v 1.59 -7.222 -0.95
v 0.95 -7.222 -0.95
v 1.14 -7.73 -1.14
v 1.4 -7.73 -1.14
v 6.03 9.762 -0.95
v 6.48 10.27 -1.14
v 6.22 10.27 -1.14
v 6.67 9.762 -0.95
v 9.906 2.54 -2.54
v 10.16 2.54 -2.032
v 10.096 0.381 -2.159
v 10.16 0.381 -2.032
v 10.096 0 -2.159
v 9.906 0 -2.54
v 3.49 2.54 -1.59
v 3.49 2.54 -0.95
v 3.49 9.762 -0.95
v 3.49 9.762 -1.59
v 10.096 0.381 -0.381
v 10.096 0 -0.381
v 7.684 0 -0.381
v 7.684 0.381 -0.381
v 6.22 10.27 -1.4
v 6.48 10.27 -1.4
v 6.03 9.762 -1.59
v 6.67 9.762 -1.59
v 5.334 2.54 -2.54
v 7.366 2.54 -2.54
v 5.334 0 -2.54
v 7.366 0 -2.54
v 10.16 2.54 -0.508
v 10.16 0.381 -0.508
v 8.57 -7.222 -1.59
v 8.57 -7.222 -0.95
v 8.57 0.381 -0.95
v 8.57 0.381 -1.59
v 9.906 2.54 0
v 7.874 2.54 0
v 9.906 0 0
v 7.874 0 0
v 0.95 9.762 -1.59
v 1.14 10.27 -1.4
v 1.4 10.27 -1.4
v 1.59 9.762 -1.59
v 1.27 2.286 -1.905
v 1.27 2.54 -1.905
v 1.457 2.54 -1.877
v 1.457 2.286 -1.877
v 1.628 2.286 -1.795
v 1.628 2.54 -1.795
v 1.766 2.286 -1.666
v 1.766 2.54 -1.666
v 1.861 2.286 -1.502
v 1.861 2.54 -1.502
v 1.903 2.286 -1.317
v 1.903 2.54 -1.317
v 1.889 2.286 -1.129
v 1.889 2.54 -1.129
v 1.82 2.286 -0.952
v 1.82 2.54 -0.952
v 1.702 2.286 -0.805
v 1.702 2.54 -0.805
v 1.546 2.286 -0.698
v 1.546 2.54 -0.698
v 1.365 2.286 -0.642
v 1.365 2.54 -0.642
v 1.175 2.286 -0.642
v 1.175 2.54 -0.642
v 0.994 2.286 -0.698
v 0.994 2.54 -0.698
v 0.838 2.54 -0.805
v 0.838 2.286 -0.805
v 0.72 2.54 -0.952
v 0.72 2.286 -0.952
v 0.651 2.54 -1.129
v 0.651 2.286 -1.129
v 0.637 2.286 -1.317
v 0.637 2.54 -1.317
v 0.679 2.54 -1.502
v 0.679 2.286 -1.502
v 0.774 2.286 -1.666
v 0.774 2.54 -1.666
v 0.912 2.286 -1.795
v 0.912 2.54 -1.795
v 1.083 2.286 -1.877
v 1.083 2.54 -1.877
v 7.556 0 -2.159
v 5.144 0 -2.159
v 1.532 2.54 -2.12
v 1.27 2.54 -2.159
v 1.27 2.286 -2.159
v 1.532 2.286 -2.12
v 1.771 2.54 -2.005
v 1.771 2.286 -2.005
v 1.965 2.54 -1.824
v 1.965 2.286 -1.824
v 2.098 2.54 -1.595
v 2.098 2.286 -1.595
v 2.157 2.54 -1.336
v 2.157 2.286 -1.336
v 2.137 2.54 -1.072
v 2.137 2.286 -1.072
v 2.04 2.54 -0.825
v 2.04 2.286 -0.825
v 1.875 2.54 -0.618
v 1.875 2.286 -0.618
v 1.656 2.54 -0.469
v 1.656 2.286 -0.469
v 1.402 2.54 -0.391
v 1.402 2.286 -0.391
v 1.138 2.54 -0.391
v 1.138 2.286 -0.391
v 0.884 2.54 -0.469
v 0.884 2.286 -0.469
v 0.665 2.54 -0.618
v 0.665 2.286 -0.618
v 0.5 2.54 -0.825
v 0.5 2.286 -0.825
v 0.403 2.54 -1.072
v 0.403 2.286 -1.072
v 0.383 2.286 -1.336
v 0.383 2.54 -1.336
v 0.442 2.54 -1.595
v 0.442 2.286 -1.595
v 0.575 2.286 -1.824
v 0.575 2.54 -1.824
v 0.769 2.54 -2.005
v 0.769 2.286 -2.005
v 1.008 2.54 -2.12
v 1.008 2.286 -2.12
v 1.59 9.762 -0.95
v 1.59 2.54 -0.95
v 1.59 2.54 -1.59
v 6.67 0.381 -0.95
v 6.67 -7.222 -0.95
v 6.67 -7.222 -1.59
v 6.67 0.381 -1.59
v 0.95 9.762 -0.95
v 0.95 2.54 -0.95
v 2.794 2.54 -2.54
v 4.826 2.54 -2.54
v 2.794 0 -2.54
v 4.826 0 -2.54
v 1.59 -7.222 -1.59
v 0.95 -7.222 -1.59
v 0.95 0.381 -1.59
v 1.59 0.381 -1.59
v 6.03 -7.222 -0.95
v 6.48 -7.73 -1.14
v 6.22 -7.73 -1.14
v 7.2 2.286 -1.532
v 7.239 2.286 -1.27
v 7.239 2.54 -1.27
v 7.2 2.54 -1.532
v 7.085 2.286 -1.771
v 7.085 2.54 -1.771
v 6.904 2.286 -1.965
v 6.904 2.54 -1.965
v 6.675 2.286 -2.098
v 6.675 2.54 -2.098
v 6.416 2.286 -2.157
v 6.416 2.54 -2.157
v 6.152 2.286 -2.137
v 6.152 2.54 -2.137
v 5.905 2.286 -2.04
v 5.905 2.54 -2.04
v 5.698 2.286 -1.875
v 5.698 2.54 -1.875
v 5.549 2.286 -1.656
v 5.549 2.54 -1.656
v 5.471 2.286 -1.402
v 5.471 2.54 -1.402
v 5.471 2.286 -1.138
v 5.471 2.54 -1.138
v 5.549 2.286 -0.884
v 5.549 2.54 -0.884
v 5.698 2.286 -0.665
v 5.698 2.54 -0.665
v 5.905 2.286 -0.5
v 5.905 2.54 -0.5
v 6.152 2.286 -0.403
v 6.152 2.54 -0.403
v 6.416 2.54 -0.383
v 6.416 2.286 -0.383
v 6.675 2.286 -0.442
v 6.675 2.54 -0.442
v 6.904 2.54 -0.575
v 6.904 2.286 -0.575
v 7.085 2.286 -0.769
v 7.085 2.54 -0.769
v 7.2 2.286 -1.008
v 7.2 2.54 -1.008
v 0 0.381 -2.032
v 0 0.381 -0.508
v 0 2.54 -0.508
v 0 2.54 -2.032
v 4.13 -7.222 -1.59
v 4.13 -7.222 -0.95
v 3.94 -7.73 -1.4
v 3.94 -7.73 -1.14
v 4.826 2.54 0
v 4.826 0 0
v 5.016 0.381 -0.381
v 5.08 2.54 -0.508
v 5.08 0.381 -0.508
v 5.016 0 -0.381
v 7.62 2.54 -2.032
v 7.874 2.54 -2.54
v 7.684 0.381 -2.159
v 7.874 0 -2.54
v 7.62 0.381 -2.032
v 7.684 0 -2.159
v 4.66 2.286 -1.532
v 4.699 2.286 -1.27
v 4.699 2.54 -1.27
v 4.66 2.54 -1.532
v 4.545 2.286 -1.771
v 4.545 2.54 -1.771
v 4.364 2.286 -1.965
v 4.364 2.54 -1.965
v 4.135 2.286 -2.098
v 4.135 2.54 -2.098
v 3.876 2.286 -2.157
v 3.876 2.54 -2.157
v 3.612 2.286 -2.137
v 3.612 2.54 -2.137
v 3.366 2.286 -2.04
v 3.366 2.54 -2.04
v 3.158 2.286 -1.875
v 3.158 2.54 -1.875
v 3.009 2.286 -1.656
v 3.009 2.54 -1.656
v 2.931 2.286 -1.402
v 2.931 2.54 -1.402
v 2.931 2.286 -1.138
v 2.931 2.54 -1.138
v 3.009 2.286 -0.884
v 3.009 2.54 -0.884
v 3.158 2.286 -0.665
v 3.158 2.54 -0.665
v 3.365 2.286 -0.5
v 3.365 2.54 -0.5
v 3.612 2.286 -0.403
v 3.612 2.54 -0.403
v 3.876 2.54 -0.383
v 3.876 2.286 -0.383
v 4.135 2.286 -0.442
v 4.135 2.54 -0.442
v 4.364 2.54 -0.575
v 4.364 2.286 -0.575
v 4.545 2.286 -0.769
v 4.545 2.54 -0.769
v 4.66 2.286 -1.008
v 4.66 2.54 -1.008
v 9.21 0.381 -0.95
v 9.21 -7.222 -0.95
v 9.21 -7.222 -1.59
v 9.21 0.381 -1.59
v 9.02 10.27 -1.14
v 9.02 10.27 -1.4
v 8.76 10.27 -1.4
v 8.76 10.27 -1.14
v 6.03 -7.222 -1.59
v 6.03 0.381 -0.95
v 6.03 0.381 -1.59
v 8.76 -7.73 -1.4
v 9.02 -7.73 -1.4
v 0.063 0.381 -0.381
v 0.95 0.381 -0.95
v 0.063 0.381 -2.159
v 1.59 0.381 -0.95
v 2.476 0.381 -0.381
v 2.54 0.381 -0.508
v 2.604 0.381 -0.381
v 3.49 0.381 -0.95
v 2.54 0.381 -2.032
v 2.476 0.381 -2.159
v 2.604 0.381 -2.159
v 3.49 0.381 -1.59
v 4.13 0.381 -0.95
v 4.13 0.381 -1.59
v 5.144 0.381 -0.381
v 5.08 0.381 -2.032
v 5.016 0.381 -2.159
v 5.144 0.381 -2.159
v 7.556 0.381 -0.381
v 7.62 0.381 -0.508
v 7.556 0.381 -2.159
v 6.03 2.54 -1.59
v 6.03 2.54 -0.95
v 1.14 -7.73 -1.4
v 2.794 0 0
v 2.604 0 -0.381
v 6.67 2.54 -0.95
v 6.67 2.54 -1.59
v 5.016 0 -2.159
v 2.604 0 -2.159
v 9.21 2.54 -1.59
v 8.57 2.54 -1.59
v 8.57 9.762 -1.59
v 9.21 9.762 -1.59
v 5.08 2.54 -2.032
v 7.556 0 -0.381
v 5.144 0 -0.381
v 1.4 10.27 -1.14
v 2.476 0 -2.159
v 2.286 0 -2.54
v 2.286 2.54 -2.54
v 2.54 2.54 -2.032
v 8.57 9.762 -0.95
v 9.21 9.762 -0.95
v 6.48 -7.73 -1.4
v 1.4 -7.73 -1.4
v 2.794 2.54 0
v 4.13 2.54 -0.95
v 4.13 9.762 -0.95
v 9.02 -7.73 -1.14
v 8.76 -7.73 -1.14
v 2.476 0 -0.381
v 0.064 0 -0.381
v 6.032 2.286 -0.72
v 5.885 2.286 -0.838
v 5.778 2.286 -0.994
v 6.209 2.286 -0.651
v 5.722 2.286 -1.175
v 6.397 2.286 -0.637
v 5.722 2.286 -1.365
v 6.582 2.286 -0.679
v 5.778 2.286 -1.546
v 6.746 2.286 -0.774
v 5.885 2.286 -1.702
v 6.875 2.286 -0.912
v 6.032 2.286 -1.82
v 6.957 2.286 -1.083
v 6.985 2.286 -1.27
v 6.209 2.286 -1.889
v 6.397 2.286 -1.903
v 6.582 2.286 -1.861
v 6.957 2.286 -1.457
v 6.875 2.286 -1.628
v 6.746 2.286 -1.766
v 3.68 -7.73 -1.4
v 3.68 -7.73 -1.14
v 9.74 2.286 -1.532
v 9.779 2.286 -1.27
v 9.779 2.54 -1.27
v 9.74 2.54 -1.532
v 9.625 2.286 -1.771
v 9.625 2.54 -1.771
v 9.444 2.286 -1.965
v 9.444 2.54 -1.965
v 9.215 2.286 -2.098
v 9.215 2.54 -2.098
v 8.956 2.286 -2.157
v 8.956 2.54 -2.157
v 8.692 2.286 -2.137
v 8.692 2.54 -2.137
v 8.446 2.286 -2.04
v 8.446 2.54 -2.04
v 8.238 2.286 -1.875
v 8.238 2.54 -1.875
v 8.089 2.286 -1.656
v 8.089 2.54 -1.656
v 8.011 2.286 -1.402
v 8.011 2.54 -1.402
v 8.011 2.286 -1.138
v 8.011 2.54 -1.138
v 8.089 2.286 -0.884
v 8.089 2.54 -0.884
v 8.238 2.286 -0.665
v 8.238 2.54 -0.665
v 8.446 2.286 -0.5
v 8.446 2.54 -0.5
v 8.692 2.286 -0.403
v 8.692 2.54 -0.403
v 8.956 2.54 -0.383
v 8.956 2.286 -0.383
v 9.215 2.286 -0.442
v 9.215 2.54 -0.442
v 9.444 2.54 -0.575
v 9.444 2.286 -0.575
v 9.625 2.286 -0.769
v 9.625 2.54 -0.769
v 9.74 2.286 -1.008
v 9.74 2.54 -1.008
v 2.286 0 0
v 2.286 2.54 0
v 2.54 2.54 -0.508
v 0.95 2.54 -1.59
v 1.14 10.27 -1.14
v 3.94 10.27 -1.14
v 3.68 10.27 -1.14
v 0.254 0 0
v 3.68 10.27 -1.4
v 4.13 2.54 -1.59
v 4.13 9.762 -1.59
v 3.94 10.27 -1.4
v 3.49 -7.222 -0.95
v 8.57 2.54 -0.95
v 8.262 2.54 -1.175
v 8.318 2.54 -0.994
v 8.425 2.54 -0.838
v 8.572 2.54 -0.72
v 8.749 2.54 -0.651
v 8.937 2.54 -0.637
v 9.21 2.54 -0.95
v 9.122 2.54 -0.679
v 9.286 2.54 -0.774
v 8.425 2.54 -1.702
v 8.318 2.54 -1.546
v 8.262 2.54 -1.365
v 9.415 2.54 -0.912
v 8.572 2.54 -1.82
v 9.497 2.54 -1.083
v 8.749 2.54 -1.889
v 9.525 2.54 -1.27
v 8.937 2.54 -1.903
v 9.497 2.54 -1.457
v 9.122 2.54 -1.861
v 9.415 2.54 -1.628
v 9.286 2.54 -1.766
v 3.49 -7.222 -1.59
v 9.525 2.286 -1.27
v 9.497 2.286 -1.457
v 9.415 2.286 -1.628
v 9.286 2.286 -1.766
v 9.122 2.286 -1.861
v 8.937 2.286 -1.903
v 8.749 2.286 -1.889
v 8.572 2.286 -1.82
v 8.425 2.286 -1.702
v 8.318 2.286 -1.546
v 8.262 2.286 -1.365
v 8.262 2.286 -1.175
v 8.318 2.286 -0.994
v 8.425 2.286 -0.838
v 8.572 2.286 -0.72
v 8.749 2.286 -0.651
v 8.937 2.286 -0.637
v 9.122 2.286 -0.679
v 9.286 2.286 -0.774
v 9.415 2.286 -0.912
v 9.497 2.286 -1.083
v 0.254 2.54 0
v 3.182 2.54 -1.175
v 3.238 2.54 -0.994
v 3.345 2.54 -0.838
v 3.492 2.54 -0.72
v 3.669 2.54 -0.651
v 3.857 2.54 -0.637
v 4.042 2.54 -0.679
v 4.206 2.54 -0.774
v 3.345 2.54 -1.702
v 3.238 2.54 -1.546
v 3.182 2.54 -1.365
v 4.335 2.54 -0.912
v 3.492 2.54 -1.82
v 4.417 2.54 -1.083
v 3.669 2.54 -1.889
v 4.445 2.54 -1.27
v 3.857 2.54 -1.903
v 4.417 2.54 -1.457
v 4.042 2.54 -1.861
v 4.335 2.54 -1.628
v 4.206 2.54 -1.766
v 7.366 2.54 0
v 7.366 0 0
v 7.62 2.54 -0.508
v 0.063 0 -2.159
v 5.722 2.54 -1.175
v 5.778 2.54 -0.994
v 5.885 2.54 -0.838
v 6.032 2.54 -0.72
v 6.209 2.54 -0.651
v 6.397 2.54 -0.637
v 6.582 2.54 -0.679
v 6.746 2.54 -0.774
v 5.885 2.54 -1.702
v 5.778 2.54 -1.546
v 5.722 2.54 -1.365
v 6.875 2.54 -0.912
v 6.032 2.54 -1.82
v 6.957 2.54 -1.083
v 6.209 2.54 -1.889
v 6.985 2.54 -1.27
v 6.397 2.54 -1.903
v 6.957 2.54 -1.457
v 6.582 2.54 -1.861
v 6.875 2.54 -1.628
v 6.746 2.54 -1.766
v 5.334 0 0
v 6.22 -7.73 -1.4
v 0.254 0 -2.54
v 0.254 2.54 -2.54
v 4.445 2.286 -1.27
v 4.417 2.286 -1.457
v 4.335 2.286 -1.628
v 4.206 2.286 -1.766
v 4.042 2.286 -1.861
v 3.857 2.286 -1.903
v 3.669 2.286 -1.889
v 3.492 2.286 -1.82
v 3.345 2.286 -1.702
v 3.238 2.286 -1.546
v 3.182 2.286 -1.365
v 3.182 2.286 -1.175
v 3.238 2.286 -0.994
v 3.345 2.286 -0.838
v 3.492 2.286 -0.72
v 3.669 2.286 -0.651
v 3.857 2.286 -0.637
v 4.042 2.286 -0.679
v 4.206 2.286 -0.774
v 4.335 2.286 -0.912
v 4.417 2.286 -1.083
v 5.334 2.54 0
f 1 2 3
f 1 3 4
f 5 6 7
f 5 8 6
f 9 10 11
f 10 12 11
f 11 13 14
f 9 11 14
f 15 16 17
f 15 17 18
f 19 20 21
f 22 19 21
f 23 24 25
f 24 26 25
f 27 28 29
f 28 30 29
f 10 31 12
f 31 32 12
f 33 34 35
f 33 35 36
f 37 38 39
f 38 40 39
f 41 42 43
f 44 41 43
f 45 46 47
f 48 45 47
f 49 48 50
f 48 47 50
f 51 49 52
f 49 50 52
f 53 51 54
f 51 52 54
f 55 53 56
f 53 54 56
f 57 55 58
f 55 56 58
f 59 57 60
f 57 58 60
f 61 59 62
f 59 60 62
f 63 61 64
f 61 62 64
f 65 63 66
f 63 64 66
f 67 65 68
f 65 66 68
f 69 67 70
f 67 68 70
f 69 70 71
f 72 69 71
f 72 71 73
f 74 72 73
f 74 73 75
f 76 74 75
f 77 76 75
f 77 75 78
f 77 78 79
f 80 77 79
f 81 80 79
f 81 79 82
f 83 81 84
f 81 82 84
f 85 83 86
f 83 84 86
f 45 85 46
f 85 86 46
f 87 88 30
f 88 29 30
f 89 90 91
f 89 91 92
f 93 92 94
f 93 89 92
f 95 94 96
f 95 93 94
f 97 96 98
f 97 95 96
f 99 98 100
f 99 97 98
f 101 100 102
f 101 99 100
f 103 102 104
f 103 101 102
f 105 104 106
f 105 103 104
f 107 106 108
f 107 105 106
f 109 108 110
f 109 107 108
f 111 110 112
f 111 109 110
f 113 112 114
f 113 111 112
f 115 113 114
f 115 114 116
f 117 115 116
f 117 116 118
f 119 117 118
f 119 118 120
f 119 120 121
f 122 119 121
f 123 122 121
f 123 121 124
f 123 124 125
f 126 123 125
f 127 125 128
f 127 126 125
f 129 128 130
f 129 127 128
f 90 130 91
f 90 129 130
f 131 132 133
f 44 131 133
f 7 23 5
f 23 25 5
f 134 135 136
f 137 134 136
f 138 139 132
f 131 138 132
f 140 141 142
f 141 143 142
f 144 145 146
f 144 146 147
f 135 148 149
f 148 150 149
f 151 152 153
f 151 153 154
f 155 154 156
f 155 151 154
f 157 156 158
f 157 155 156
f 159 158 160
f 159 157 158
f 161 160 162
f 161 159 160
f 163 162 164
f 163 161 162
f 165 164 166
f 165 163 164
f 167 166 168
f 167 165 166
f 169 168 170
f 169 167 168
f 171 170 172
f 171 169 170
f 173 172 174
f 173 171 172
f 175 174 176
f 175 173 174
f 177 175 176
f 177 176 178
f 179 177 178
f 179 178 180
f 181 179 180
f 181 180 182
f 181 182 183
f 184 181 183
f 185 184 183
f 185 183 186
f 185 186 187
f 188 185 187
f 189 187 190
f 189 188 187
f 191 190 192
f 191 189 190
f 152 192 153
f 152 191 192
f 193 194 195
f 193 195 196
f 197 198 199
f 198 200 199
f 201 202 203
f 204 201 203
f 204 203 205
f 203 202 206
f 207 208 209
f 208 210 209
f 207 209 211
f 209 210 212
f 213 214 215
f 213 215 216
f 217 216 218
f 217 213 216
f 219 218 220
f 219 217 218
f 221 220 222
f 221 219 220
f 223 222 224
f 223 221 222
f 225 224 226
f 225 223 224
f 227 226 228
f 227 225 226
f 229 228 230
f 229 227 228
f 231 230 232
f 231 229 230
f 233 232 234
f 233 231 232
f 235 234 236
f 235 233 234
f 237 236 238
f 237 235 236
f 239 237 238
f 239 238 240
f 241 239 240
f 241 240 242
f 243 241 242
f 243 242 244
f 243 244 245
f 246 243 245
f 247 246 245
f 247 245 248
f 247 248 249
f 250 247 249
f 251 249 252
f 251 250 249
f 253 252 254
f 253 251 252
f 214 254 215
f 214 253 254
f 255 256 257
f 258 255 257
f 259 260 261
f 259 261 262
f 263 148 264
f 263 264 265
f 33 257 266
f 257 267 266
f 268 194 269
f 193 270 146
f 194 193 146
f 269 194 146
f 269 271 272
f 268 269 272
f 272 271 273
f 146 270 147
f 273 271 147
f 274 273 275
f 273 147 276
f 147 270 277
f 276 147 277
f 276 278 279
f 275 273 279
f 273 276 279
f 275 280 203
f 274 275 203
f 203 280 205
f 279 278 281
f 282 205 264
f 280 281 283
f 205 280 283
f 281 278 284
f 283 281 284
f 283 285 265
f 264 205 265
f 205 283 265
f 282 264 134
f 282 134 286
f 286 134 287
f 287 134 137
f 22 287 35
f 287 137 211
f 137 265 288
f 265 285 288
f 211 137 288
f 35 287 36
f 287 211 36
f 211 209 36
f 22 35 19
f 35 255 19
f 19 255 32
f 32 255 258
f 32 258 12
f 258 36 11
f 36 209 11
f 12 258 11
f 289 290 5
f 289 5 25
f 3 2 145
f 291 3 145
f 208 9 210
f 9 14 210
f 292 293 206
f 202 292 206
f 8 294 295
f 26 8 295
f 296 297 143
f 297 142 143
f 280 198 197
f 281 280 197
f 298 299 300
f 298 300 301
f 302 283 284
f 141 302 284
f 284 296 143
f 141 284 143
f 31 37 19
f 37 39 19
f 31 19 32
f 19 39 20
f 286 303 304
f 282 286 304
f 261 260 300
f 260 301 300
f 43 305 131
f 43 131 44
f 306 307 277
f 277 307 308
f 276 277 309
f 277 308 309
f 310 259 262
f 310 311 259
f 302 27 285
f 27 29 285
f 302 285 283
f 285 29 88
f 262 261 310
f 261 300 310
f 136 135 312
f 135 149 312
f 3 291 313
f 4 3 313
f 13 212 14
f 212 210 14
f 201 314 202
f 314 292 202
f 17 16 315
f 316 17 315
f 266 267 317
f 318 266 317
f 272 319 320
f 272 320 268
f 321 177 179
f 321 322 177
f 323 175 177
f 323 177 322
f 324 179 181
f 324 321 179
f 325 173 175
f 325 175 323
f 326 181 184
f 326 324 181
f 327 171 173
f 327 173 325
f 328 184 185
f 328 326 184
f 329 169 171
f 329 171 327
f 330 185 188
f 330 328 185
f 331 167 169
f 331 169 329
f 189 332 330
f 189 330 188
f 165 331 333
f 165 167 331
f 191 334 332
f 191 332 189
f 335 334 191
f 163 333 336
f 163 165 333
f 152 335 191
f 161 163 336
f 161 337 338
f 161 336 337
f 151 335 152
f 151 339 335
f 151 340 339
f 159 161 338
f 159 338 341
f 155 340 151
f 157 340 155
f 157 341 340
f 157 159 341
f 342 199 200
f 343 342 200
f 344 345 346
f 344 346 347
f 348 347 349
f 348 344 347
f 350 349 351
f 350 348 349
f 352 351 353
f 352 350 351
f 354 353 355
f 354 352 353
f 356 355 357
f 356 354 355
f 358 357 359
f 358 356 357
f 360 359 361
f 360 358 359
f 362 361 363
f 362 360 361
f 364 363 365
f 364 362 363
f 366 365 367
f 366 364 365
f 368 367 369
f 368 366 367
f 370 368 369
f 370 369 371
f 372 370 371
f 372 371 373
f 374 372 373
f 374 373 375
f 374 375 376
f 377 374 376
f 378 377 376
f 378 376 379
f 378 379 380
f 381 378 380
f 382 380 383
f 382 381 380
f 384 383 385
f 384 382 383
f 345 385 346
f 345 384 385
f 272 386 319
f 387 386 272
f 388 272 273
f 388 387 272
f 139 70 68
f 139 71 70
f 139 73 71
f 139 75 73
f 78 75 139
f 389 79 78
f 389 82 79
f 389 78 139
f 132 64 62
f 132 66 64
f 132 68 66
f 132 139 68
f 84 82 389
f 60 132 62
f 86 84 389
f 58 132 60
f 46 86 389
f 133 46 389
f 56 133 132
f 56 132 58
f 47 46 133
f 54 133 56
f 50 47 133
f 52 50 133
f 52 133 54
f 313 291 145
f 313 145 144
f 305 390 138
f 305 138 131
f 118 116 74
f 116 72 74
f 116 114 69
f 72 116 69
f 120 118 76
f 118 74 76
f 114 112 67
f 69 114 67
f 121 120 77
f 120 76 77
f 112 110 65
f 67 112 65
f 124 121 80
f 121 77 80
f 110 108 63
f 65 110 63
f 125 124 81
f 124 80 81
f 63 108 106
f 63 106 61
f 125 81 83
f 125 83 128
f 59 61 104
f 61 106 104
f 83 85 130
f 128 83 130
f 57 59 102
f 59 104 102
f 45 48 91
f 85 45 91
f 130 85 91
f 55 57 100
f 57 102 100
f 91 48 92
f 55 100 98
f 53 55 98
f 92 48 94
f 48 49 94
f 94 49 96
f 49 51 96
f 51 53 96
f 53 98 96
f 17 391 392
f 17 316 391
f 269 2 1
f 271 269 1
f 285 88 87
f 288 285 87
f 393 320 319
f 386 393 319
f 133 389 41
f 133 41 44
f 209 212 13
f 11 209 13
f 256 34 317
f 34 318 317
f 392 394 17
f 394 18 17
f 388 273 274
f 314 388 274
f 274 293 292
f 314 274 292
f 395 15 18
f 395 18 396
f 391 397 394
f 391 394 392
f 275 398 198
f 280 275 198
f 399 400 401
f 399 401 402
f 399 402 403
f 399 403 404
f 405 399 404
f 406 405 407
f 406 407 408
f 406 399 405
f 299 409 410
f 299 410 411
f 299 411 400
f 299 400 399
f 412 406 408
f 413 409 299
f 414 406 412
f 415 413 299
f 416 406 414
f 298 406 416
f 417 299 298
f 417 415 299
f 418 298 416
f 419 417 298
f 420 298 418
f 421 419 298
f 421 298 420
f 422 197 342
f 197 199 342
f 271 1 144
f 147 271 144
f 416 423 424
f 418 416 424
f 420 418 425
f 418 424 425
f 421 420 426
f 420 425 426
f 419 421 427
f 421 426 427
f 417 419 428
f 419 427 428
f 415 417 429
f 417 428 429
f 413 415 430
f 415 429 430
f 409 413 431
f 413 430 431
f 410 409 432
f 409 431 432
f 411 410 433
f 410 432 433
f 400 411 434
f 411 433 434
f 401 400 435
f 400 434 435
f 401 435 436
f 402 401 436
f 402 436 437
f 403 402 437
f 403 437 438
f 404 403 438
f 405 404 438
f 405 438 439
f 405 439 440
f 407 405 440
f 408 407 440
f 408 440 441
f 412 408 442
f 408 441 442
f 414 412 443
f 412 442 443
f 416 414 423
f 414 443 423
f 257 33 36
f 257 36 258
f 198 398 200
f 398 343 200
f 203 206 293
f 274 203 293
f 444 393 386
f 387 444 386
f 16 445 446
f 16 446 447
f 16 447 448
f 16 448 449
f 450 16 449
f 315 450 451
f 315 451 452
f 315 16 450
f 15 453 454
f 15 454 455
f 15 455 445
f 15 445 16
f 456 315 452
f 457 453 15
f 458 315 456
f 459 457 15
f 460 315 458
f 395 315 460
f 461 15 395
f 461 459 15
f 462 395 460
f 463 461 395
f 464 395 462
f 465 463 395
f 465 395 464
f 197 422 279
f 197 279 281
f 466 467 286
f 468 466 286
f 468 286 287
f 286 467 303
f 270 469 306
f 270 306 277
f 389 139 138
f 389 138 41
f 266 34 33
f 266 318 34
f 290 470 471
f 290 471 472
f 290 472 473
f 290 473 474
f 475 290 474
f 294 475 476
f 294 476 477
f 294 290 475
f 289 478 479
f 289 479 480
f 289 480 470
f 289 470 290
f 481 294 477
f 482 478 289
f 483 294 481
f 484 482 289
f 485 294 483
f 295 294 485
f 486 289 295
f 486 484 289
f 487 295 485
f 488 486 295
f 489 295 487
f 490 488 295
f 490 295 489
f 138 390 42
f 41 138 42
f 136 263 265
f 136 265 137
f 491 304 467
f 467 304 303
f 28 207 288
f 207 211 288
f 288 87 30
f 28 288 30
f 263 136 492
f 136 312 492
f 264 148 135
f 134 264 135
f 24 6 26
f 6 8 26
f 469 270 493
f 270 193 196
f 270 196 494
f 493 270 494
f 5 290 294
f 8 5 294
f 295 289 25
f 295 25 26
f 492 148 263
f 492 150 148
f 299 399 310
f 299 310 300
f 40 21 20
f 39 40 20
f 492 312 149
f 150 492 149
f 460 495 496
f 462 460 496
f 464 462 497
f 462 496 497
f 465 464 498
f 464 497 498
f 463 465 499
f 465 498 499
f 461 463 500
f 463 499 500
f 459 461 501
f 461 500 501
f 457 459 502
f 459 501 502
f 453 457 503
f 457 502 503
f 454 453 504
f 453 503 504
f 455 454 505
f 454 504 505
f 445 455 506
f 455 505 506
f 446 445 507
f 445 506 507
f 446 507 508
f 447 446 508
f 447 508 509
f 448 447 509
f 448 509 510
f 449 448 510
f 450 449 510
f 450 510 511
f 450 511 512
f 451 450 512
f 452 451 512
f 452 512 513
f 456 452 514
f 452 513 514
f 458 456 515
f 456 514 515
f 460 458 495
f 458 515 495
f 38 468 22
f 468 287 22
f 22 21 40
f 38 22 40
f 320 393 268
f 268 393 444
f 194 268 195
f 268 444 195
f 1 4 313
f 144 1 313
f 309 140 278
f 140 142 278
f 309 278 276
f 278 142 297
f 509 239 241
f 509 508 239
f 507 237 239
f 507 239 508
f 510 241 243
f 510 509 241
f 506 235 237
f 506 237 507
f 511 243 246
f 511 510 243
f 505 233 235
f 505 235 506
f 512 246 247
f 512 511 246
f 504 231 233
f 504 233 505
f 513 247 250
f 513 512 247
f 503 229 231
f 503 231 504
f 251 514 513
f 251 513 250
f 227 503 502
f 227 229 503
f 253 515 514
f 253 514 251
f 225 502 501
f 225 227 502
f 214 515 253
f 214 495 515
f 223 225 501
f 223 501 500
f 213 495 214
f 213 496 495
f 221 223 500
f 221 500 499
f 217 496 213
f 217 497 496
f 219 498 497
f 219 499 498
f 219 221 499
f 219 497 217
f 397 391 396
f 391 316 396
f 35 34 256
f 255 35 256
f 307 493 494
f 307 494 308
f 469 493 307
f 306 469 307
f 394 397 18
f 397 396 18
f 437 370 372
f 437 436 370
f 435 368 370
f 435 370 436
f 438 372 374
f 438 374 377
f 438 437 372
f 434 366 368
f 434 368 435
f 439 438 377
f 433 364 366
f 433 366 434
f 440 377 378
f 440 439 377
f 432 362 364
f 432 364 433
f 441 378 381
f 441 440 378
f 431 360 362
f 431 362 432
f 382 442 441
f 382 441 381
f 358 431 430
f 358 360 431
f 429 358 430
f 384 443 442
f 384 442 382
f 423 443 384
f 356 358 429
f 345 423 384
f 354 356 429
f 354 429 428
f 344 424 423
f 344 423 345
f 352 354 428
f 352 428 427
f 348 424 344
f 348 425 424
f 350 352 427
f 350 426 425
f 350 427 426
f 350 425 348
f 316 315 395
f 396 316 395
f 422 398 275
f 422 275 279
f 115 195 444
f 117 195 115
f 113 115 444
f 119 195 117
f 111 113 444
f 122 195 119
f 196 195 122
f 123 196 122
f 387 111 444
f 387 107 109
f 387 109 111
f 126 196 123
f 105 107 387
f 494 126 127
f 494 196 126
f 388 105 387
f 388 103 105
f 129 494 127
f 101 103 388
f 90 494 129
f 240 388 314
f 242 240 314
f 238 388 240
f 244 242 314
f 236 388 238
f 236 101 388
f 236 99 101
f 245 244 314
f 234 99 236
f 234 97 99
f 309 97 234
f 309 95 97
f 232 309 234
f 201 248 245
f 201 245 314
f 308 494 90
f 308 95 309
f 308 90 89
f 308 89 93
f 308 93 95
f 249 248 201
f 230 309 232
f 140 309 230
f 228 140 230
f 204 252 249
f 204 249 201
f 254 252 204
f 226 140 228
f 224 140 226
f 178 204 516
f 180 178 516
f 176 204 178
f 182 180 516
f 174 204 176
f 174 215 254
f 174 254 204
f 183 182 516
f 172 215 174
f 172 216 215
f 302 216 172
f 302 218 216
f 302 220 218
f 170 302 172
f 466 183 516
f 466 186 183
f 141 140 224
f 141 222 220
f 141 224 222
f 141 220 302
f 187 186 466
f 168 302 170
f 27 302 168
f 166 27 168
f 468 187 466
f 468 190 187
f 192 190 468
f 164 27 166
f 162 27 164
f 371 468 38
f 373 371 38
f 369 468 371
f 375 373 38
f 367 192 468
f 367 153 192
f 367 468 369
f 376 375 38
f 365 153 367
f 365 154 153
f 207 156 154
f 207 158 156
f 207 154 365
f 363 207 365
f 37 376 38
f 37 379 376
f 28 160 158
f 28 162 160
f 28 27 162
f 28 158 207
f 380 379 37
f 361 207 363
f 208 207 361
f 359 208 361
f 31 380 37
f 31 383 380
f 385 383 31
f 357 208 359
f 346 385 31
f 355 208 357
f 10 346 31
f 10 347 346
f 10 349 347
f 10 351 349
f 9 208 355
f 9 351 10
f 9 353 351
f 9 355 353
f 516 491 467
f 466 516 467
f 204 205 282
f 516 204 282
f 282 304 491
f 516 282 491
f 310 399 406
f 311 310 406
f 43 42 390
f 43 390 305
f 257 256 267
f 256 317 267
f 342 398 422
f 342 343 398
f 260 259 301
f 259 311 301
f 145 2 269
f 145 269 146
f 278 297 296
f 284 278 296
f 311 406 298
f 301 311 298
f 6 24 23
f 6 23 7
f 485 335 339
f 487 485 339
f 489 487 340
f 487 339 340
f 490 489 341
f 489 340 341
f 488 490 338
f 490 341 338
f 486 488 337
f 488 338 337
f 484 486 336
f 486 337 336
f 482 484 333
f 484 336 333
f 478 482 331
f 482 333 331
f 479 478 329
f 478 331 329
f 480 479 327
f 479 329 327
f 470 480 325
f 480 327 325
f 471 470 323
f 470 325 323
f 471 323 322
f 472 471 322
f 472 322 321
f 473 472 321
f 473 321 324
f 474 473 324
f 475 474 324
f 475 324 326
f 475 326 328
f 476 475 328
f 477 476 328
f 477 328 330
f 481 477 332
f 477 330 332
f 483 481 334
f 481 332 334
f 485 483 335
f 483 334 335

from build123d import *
from OCP.BRepFilletAPI import BRepFilletAPI_MakeChamfer

# Parameters (mm, degrees)
SKETCH1_W                          = 2.54
SKETCH1_H                          = 2.54
MAIN_BODY_DEPTH                    = 2.54
SKETCH3_W                          = 1.778
SKETCH3_H                          = 0.381
CUT_EXTRUDE1_DEPTH                 = 5.399409051
CUT_EXTRUDE2_DEPTH                 = 5.399409051
PIN_START                          = -10.27
SKETCH2_W                          = 0.64
SKETCH2_H                          = 0.64
PIN_DEPTH                          = 18
CHAMFER1_SIZE                      = 0.508
CHAMFER1_SIZE2                     = 0.1905
CHAMFER2_SIZE                      = 0.1905
CHAMFER2_SIZE2                     = 0.508
ESQUISSE1_R                        = 0.889
ESQUISSE1_R_2                      = 0.635
ENL_V_MAT_EXTRU_1_DEPTH            = 0.254
R_P_TITION_START                   = 0.381
R_P_TITION_LIN_AIRE3_DEPTH         = 1.905
R_P_TITION_START_2                 = -7.222
R_P_TITION_LIN_AIRE3_2_OUTLINE_W   = 0.64
R_P_TITION_LIN_AIRE3_2_OUTLINE_H   = 0.64
R_P_TITION_LIN_AIRE3_2_DEPTH       = 16.984
R_P_TITION_START_3                 = 2.286
R_P_TITION_LIN_AIRE3_3_OUTLINE_R   = 0.889
R_P_TITION_LIN_AIRE3_3_OUTLINE_R_2 = 0.635
R_P_TITION_LIN_AIRE3_3_OUTLINE_W   = 0.64
R_P_TITION_LIN_AIRE3_3_OUTLINE_H   = 0.64
R_P_TITION_LIN_AIRE3_3_DEPTH       = 0.254
R_P_TITION_LIN_AIRE3_4_DEPTH       = 0.381


with BuildPart() as part:
    # Sketch1 → Main Body (new body)
    with BuildSketch(Plane(origin=(0, 0, 0), x_dir=(1, 0, 0), z_dir=(0, 1, 0))):
        with Locations((1.27, 1.27)):
            Rectangle(SKETCH1_W, SKETCH1_H)
    extrude(amount=MAIN_BODY_DEPTH)

    # Sketch3 → Cut-Extrude1 (cut, through all)
    with BuildSketch(Plane.ZY):
        with Locations((-1.27, 0.1905)):
            Rectangle(SKETCH3_W, SKETCH3_H)
    extrude(amount=-CUT_EXTRUDE1_DEPTH, mode=Mode.SUBTRACT)

    # Sketch4 → Cut-Extrude2 (cut, through all)
    with BuildSketch(Plane(origin=(0, 2.54, 0), x_dir=(1, 0, 0), z_dir=(0, 1, 0))):
        Polygon((0.254, 2.54), (0, 2.54), (0, 2.032), align=None)
        Polygon((2.54, 2.54), (2.286, 2.54), (2.54, 2.032), align=None)
        Polygon((0.254, 0), (0, 0.508), (0, 0), align=None)
        Polygon((2.54, 0), (2.286, 0), (2.54, 0.508), align=None)
    extrude(amount=-CUT_EXTRUDE2_DEPTH, mode=Mode.SUBTRACT)

    # Sketch2 → Pin (add)
    with BuildSketch(Plane(origin=(0, 2.54, 0), x_dir=(1, 0, 0), z_dir=(0, 1, 0)).offset(PIN_START)):
        with Locations((1.27, 1.27)):
            Rectangle(SKETCH2_W, SKETCH2_H)
    extrude(amount=PIN_DEPTH)

    # Chamfer1: one chamfer whose edges measure the first distance from different faces: ONE call of the kernel's chamfer builder (chamfer() names one face for all edges)
    chamfer1_edges_1 = [part.edges().sort_by_distance(p)[0] for p in [
        (0.95, 10.27, -1.27),
    ]]
    chamfer1_side_1 = [part.faces().sort_by_distance(p)[0] for p in [
        (0.95, 6.405, -1.27),
    ]]
    chamfer1_edges_2 = [part.edges().sort_by_distance(p)[0] for p in [
        (1.27, 10.27, -0.95),
    ]]
    chamfer1_side_2 = [part.faces().sort_by_distance(p)[0] for p in [
        (1.27, 6.405, -0.95),
    ]]
    chamfer1_edges_3 = [part.edges().sort_by_distance(p)[0] for p in [
        (1.59, 10.27, -1.27),
    ]]
    chamfer1_side_3 = [part.faces().sort_by_distance(p)[0] for p in [
        (1.59, 6.405, -1.27),
    ]]
    chamfer1_edges_4 = [part.edges().sort_by_distance(p)[0] for p in [
        (1.27, 10.27, -1.59),
    ]]
    chamfer1_side_4 = [part.faces().sort_by_distance(p)[0] for p in [
        (1.27, 6.405, -1.59),
    ]]
    chamfer1 = BRepFilletAPI_MakeChamfer(part.part.solid().wrapped)
    for e in chamfer1_edges_1:
        chamfer1.Add(CHAMFER1_SIZE, CHAMFER1_SIZE2, e.wrapped, chamfer1_side_1[0].wrapped)  # the first distance lies on this face
    for e in chamfer1_edges_2:
        chamfer1.Add(CHAMFER1_SIZE, CHAMFER1_SIZE2, e.wrapped, chamfer1_side_2[0].wrapped)  # the first distance lies on this face
    for e in chamfer1_edges_3:
        chamfer1.Add(CHAMFER1_SIZE, CHAMFER1_SIZE2, e.wrapped, chamfer1_side_3[0].wrapped)  # the first distance lies on this face
    for e in chamfer1_edges_4:
        chamfer1.Add(CHAMFER1_SIZE, CHAMFER1_SIZE2, e.wrapped, chamfer1_side_4[0].wrapped)  # the first distance lies on this face
    add(Compound.cast(chamfer1.Shape()), mode=Mode.REPLACE)

    # Chamfer2
    chamfer2_edges = [part.edges().sort_by_distance(p)[0] for p in [
        (1.59, -7.73, -1.27),
        (1.27, -7.73, -0.95),
        (0.95, -7.73, -1.27),
        (1.27, -7.73, -1.59),
    ]]
    chamfer2_side = [part.faces().sort_by_distance(p)[0] for p in [
        (1.27, -7.73, -1.27),
    ]]
    chamfer(chamfer2_edges, length=CHAMFER2_SIZE, length2=CHAMFER2_SIZE2, reference=chamfer2_side[0])

    # Esquisse1 → Enlèv. mat.-Extru.1 (cut)
    with BuildSketch(Plane.XZ.offset(-2.54)):
        with Locations(Location((1.27, -1.27, 0), (0, 0, 270))):
            Circle(ESQUISSE1_R)
        with Locations(Location((1.27, -1.27, 0), (0, 0, 270))):
            Circle(ESQUISSE1_R_2, mode=Mode.SUBTRACT)
    extrude(amount=ENL_V_MAT_EXTRU_1_DEPTH, mode=Mode.SUBTRACT)

    # Répétition linéaire3: read off the stored shape, not the designer's step
    # Répétition linéaire3 outline → Répétition linéaire3 (add)
    with BuildSketch(Plane(origin=(0, 0, 0), x_dir=(1, 0, 0), z_dir=(0, 1, 0)).offset(R_P_TITION_START)):
        Polygon((5.334, 0), (7.366, 0), (7.62, 0.508), (7.874, 0), (9.906, 0), (10.16, 0.508), (10.16, 2.032), (9.906, 2.54), (7.874, 2.54), (7.62, 2.032), (7.366, 2.54), (5.334, 2.54), (5.08, 2.032), (4.826, 2.54), (2.794, 2.54), (2.54, 2.032), (2.54, 0.508), (2.794, 0), (4.826, 0), (5.08, 0.508), align=None)
    extrude(amount=R_P_TITION_LIN_AIRE3_DEPTH)

    # R_p_tition lin_aire3 2 outline → R_p_tition lin_aire3 2 (add)
    with BuildSketch(Plane(origin=(0, 0, 0), x_dir=(1, 0, 0), z_dir=(0, 1, 0)).offset(R_P_TITION_START_2)):
        with Locations((3.81, 1.27)):
            Rectangle(R_P_TITION_LIN_AIRE3_2_OUTLINE_W, R_P_TITION_LIN_AIRE3_2_OUTLINE_H)
        with Locations((6.35, 1.27)):
            Rectangle(R_P_TITION_LIN_AIRE3_2_OUTLINE_W, R_P_TITION_LIN_AIRE3_2_OUTLINE_H)
        with Locations((8.89, 1.27)):
            Rectangle(R_P_TITION_LIN_AIRE3_2_OUTLINE_W, R_P_TITION_LIN_AIRE3_2_OUTLINE_H)
    extrude(amount=R_P_TITION_LIN_AIRE3_2_DEPTH)

    # R_p_tition lin_aire3 3 outline → R_p_tition lin_aire3 3 (add)
    # profile 1 of 4: a face of its own
    with BuildSketch(Plane(origin=(0, 0, 0), x_dir=(1, 0, 0), z_dir=(0, 1, 0)).offset(R_P_TITION_START_3)):
        Polygon((5.334, 0), (7.366, 0), (7.62, 0.508), (7.874, 0), (9.906, 0), (10.16, 0.508), (10.16, 2.032), (9.906, 2.54), (7.874, 2.54), (7.62, 2.032), (7.366, 2.54), (5.334, 2.54), (5.08, 2.032), (4.826, 2.54), (2.794, 2.54), (2.54, 2.032), (2.54, 0.508), (2.794, 0), (4.826, 0), (5.08, 0.508), align=None)
        with Locations((3.81, 1.27)):
            Circle(R_P_TITION_LIN_AIRE3_3_OUTLINE_R, mode=Mode.SUBTRACT)
        with Locations((6.35, 1.27)):
            Circle(R_P_TITION_LIN_AIRE3_3_OUTLINE_R, mode=Mode.SUBTRACT)
        with Locations((8.89, 1.27)):
            Circle(R_P_TITION_LIN_AIRE3_3_OUTLINE_R, mode=Mode.SUBTRACT)
    # profile 2 of 4: a face of its own
    with BuildSketch(Plane(origin=(0, 0, 0), x_dir=(1, 0, 0), z_dir=(0, 1, 0)).offset(R_P_TITION_START_3)):
        with Locations((8.89, 1.27)):
            Circle(R_P_TITION_LIN_AIRE3_3_OUTLINE_R_2)
        with Locations((8.89, 1.27)):
            Rectangle(R_P_TITION_LIN_AIRE3_3_OUTLINE_W, R_P_TITION_LIN_AIRE3_3_OUTLINE_H, mode=Mode.SUBTRACT)
    # profile 3 of 4: a face of its own
    with BuildSketch(Plane(origin=(0, 0, 0), x_dir=(1, 0, 0), z_dir=(0, 1, 0)).offset(R_P_TITION_START_3)):
        with Locations((6.35, 1.27)):
            Circle(R_P_TITION_LIN_AIRE3_3_OUTLINE_R_2)
        with Locations((6.35, 1.27)):
            Rectangle(R_P_TITION_LIN_AIRE3_3_OUTLINE_W, R_P_TITION_LIN_AIRE3_3_OUTLINE_H, mode=Mode.SUBTRACT)
    # profile 4 of 4: a face of its own
    with BuildSketch(Plane(origin=(0, 0, 0), x_dir=(1, 0, 0), z_dir=(0, 1, 0)).offset(R_P_TITION_START_3)):
        with Locations((3.81, 1.27)):
            Circle(R_P_TITION_LIN_AIRE3_3_OUTLINE_R_2)
        with Locations((3.81, 1.27)):
            Rectangle(R_P_TITION_LIN_AIRE3_3_OUTLINE_W, R_P_TITION_LIN_AIRE3_3_OUTLINE_H, mode=Mode.SUBTRACT)
    extrude(amount=R_P_TITION_LIN_AIRE3_3_DEPTH)

    # R_p_tition lin_aire3 4 outline → R_p_tition lin_aire3 4 (add)
    with BuildSketch(Plane(origin=(0, 0, 0), x_dir=(1, 0, 0), z_dir=(0, 1, 0))):
        Polygon((5.334, 0), (7.366, 0), (7.5565, 0.381), (5.1435, 0.381), align=None)
        Polygon((5.1435, 2.159), (7.5565, 2.159), (7.366, 2.54), (5.334, 2.54), align=None)
        Polygon((10.0965, 0.381), (7.6835, 0.381), (7.874, 0), (9.906, 0), align=None)
        Polygon((4.826, 0), (5.0165, 0.381), (2.6035, 0.381), (2.794, 0), align=None)
        Polygon((7.6835, 2.159), (10.0965, 2.159), (9.906, 2.54), (7.874, 2.54), align=None)
        Polygon((2.6035, 2.159), (5.0165, 2.159), (4.826, 2.54), (2.794, 2.54), align=None)
    extrude(amount=R_P_TITION_LIN_AIRE3_4_DEPTH)

    # R_p_tition lin_aire3 5: loft between two sections, ruled curve by curve
    r_p_tition_lin_aire3_5_from = [
        Edge.make_line((3.49, -7.222, -0.95), (4.13, -7.222, -0.95)),
        Edge.make_line((4.13, -7.222, -1.59), (3.49, -7.222, -1.59)),
        Edge.make_line((4.13, -7.222, -0.95), (4.13, -7.222, -1.59)),
        Edge.make_line((3.49, -7.222, -0.95), (3.49, -7.222, -1.59)),
    ]
    r_p_tition_lin_aire3_5_to = [
        Edge.make_line((3.6805, -7.73, -1.1405), (3.9395, -7.73, -1.1405)),
        Edge.make_line((3.9395, -7.73, -1.3995), (3.6805, -7.73, -1.3995)),
        Edge.make_line((3.9395, -7.73, -1.1405), (3.9395, -7.73, -1.3995)),
        Edge.make_line((3.6805, -7.73, -1.1405), (3.6805, -7.73, -1.3995)),
    ]
    r_p_tition_lin_aire3_5 = Solid(Shell([*[Face.make_surface_from_curves(r_p_tition_lin_aire3_5_from[k], r_p_tition_lin_aire3_5_to[k]) for k in range(4)], Face(Wire(r_p_tition_lin_aire3_5_from)), Face(Wire(r_p_tition_lin_aire3_5_to))]))
    add(r_p_tition_lin_aire3_5)

    # R_p_tition lin_aire3 6: loft between two sections, ruled curve by curve
    r_p_tition_lin_aire3_6_from = [
        Edge.make_line((6.03, -7.222, -0.95), (6.67, -7.222, -0.95)),
        Edge.make_line((6.67, -7.222, -1.59), (6.03, -7.222, -1.59)),
        Edge.make_line((6.67, -7.222, -0.95), (6.67, -7.222, -1.59)),
        Edge.make_line((6.03, -7.222, -0.95), (6.03, -7.222, -1.59)),
    ]
    r_p_tition_lin_aire3_6_to = [
        Edge.make_line((6.2205, -7.73, -1.1405), (6.4795, -7.73, -1.1405)),
        Edge.make_line((6.4795, -7.73, -1.3995), (6.2205, -7.73, -1.3995)),
        Edge.make_line((6.4795, -7.73, -1.1405), (6.4795, -7.73, -1.3995)),
        Edge.make_line((6.2205, -7.73, -1.1405), (6.2205, -7.73, -1.3995)),
    ]
    r_p_tition_lin_aire3_6 = Solid(Shell([*[Face.make_surface_from_curves(r_p_tition_lin_aire3_6_from[k], r_p_tition_lin_aire3_6_to[k]) for k in range(4)], Face(Wire(r_p_tition_lin_aire3_6_from)), Face(Wire(r_p_tition_lin_aire3_6_to))]))
    add(r_p_tition_lin_aire3_6)

    # R_p_tition lin_aire3 7: loft between two sections, ruled curve by curve
    r_p_tition_lin_aire3_7_from = [
        Edge.make_line((8.57, -7.222, -0.95), (9.21, -7.222, -0.95)),
        Edge.make_line((9.21, -7.222, -1.59), (8.57, -7.222, -1.59)),
        Edge.make_line((9.21, -7.222, -0.95), (9.21, -7.222, -1.59)),
        Edge.make_line((8.57, -7.222, -0.95), (8.57, -7.222, -1.59)),
    ]
    r_p_tition_lin_aire3_7_to = [
        Edge.make_line((8.7605, -7.73, -1.1405), (9.0195, -7.73, -1.1405)),
        Edge.make_line((9.0195, -7.73, -1.3995), (8.7605, -7.73, -1.3995)),
        Edge.make_line((9.0195, -7.73, -1.1405), (9.0195, -7.73, -1.3995)),
        Edge.make_line((8.7605, -7.73, -1.1405), (8.7605, -7.73, -1.3995)),
    ]
    r_p_tition_lin_aire3_7 = Solid(Shell([*[Face.make_surface_from_curves(r_p_tition_lin_aire3_7_from[k], r_p_tition_lin_aire3_7_to[k]) for k in range(4)], Face(Wire(r_p_tition_lin_aire3_7_from)), Face(Wire(r_p_tition_lin_aire3_7_to))]))
    add(r_p_tition_lin_aire3_7)

    # R_p_tition lin_aire3 8: loft between two sections, ruled curve by curve
    r_p_tition_lin_aire3_8_from = [
        Edge.make_line((9.0195, 10.27, -1.3995), (8.7605, 10.27, -1.3995)),
        Edge.make_line((9.0195, 10.27, -1.1405), (8.7605, 10.27, -1.1405)),
        Edge.make_line((9.0195, 10.27, -1.1405), (9.0195, 10.27, -1.3995)),
        Edge.make_line((8.7605, 10.27, -1.3995), (8.7605, 10.27, -1.1405)),
    ]
    r_p_tition_lin_aire3_8_to = [
        Edge.make_line((9.21, 9.762, -1.59), (8.57, 9.762, -1.59)),
        Edge.make_line((9.21, 9.762, -0.95), (8.57, 9.762, -0.95)),
        Edge.make_line((9.21, 9.762, -0.95), (9.21, 9.762, -1.59)),
        Edge.make_line((8.57, 9.762, -1.59), (8.57, 9.762, -0.95)),
    ]
    r_p_tition_lin_aire3_8 = Solid(Shell([*[Face.make_surface_from_curves(r_p_tition_lin_aire3_8_from[k], r_p_tition_lin_aire3_8_to[k]) for k in range(4)], Face(Wire(r_p_tition_lin_aire3_8_from)), Face(Wire(r_p_tition_lin_aire3_8_to))]))
    add(r_p_tition_lin_aire3_8)

    # R_p_tition lin_aire3 9: loft between two sections, ruled curve by curve
    r_p_tition_lin_aire3_9_from = [
        Edge.make_line((6.4795, 10.27, -1.3995), (6.2205, 10.27, -1.3995)),
        Edge.make_line((6.4795, 10.27, -1.1405), (6.2205, 10.27, -1.1405)),
        Edge.make_line((6.4795, 10.27, -1.1405), (6.4795, 10.27, -1.3995)),
        Edge.make_line((6.2205, 10.27, -1.3995), (6.2205, 10.27, -1.1405)),
    ]
    r_p_tition_lin_aire3_9_to = [
        Edge.make_line((6.67, 9.762, -1.59), (6.03, 9.762, -1.59)),
        Edge.make_line((6.67, 9.762, -0.95), (6.03, 9.762, -0.95)),
        Edge.make_line((6.67, 9.762, -0.95), (6.67, 9.762, -1.59)),
        Edge.make_line((6.03, 9.762, -1.59), (6.03, 9.762, -0.95)),
    ]
    r_p_tition_lin_aire3_9 = Solid(Shell([*[Face.make_surface_from_curves(r_p_tition_lin_aire3_9_from[k], r_p_tition_lin_aire3_9_to[k]) for k in range(4)], Face(Wire(r_p_tition_lin_aire3_9_from)), Face(Wire(r_p_tition_lin_aire3_9_to))]))
    add(r_p_tition_lin_aire3_9)

    # R_p_tition lin_aire3 10: loft between two sections, ruled curve by curve
    r_p_tition_lin_aire3_10_from = [
        Edge.make_line((3.9395, 10.27, -1.3995), (3.6805, 10.27, -1.3995)),
        Edge.make_line((3.9395, 10.27, -1.1405), (3.6805, 10.27, -1.1405)),
        Edge.make_line((3.9395, 10.27, -1.1405), (3.9395, 10.27, -1.3995)),
        Edge.make_line((3.6805, 10.27, -1.3995), (3.6805, 10.27, -1.1405)),
    ]
    r_p_tition_lin_aire3_10_to = [
        Edge.make_line((4.13, 9.762, -1.59), (3.49, 9.762, -1.59)),
        Edge.make_line((4.13, 9.762, -0.95), (3.49, 9.762, -0.95)),
        Edge.make_line((4.13, 9.762, -0.95), (4.13, 9.762, -1.59)),
        Edge.make_line((3.49, 9.762, -1.59), (3.49, 9.762, -0.95)),
    ]
    r_p_tition_lin_aire3_10 = Solid(Shell([*[Face.make_surface_from_curves(r_p_tition_lin_aire3_10_from[k], r_p_tition_lin_aire3_10_to[k]) for k in range(4)], Face(Wire(r_p_tition_lin_aire3_10_from)), Face(Wire(r_p_tition_lin_aire3_10_to))]))
    add(r_p_tition_lin_aire3_10)


solid = part.part
